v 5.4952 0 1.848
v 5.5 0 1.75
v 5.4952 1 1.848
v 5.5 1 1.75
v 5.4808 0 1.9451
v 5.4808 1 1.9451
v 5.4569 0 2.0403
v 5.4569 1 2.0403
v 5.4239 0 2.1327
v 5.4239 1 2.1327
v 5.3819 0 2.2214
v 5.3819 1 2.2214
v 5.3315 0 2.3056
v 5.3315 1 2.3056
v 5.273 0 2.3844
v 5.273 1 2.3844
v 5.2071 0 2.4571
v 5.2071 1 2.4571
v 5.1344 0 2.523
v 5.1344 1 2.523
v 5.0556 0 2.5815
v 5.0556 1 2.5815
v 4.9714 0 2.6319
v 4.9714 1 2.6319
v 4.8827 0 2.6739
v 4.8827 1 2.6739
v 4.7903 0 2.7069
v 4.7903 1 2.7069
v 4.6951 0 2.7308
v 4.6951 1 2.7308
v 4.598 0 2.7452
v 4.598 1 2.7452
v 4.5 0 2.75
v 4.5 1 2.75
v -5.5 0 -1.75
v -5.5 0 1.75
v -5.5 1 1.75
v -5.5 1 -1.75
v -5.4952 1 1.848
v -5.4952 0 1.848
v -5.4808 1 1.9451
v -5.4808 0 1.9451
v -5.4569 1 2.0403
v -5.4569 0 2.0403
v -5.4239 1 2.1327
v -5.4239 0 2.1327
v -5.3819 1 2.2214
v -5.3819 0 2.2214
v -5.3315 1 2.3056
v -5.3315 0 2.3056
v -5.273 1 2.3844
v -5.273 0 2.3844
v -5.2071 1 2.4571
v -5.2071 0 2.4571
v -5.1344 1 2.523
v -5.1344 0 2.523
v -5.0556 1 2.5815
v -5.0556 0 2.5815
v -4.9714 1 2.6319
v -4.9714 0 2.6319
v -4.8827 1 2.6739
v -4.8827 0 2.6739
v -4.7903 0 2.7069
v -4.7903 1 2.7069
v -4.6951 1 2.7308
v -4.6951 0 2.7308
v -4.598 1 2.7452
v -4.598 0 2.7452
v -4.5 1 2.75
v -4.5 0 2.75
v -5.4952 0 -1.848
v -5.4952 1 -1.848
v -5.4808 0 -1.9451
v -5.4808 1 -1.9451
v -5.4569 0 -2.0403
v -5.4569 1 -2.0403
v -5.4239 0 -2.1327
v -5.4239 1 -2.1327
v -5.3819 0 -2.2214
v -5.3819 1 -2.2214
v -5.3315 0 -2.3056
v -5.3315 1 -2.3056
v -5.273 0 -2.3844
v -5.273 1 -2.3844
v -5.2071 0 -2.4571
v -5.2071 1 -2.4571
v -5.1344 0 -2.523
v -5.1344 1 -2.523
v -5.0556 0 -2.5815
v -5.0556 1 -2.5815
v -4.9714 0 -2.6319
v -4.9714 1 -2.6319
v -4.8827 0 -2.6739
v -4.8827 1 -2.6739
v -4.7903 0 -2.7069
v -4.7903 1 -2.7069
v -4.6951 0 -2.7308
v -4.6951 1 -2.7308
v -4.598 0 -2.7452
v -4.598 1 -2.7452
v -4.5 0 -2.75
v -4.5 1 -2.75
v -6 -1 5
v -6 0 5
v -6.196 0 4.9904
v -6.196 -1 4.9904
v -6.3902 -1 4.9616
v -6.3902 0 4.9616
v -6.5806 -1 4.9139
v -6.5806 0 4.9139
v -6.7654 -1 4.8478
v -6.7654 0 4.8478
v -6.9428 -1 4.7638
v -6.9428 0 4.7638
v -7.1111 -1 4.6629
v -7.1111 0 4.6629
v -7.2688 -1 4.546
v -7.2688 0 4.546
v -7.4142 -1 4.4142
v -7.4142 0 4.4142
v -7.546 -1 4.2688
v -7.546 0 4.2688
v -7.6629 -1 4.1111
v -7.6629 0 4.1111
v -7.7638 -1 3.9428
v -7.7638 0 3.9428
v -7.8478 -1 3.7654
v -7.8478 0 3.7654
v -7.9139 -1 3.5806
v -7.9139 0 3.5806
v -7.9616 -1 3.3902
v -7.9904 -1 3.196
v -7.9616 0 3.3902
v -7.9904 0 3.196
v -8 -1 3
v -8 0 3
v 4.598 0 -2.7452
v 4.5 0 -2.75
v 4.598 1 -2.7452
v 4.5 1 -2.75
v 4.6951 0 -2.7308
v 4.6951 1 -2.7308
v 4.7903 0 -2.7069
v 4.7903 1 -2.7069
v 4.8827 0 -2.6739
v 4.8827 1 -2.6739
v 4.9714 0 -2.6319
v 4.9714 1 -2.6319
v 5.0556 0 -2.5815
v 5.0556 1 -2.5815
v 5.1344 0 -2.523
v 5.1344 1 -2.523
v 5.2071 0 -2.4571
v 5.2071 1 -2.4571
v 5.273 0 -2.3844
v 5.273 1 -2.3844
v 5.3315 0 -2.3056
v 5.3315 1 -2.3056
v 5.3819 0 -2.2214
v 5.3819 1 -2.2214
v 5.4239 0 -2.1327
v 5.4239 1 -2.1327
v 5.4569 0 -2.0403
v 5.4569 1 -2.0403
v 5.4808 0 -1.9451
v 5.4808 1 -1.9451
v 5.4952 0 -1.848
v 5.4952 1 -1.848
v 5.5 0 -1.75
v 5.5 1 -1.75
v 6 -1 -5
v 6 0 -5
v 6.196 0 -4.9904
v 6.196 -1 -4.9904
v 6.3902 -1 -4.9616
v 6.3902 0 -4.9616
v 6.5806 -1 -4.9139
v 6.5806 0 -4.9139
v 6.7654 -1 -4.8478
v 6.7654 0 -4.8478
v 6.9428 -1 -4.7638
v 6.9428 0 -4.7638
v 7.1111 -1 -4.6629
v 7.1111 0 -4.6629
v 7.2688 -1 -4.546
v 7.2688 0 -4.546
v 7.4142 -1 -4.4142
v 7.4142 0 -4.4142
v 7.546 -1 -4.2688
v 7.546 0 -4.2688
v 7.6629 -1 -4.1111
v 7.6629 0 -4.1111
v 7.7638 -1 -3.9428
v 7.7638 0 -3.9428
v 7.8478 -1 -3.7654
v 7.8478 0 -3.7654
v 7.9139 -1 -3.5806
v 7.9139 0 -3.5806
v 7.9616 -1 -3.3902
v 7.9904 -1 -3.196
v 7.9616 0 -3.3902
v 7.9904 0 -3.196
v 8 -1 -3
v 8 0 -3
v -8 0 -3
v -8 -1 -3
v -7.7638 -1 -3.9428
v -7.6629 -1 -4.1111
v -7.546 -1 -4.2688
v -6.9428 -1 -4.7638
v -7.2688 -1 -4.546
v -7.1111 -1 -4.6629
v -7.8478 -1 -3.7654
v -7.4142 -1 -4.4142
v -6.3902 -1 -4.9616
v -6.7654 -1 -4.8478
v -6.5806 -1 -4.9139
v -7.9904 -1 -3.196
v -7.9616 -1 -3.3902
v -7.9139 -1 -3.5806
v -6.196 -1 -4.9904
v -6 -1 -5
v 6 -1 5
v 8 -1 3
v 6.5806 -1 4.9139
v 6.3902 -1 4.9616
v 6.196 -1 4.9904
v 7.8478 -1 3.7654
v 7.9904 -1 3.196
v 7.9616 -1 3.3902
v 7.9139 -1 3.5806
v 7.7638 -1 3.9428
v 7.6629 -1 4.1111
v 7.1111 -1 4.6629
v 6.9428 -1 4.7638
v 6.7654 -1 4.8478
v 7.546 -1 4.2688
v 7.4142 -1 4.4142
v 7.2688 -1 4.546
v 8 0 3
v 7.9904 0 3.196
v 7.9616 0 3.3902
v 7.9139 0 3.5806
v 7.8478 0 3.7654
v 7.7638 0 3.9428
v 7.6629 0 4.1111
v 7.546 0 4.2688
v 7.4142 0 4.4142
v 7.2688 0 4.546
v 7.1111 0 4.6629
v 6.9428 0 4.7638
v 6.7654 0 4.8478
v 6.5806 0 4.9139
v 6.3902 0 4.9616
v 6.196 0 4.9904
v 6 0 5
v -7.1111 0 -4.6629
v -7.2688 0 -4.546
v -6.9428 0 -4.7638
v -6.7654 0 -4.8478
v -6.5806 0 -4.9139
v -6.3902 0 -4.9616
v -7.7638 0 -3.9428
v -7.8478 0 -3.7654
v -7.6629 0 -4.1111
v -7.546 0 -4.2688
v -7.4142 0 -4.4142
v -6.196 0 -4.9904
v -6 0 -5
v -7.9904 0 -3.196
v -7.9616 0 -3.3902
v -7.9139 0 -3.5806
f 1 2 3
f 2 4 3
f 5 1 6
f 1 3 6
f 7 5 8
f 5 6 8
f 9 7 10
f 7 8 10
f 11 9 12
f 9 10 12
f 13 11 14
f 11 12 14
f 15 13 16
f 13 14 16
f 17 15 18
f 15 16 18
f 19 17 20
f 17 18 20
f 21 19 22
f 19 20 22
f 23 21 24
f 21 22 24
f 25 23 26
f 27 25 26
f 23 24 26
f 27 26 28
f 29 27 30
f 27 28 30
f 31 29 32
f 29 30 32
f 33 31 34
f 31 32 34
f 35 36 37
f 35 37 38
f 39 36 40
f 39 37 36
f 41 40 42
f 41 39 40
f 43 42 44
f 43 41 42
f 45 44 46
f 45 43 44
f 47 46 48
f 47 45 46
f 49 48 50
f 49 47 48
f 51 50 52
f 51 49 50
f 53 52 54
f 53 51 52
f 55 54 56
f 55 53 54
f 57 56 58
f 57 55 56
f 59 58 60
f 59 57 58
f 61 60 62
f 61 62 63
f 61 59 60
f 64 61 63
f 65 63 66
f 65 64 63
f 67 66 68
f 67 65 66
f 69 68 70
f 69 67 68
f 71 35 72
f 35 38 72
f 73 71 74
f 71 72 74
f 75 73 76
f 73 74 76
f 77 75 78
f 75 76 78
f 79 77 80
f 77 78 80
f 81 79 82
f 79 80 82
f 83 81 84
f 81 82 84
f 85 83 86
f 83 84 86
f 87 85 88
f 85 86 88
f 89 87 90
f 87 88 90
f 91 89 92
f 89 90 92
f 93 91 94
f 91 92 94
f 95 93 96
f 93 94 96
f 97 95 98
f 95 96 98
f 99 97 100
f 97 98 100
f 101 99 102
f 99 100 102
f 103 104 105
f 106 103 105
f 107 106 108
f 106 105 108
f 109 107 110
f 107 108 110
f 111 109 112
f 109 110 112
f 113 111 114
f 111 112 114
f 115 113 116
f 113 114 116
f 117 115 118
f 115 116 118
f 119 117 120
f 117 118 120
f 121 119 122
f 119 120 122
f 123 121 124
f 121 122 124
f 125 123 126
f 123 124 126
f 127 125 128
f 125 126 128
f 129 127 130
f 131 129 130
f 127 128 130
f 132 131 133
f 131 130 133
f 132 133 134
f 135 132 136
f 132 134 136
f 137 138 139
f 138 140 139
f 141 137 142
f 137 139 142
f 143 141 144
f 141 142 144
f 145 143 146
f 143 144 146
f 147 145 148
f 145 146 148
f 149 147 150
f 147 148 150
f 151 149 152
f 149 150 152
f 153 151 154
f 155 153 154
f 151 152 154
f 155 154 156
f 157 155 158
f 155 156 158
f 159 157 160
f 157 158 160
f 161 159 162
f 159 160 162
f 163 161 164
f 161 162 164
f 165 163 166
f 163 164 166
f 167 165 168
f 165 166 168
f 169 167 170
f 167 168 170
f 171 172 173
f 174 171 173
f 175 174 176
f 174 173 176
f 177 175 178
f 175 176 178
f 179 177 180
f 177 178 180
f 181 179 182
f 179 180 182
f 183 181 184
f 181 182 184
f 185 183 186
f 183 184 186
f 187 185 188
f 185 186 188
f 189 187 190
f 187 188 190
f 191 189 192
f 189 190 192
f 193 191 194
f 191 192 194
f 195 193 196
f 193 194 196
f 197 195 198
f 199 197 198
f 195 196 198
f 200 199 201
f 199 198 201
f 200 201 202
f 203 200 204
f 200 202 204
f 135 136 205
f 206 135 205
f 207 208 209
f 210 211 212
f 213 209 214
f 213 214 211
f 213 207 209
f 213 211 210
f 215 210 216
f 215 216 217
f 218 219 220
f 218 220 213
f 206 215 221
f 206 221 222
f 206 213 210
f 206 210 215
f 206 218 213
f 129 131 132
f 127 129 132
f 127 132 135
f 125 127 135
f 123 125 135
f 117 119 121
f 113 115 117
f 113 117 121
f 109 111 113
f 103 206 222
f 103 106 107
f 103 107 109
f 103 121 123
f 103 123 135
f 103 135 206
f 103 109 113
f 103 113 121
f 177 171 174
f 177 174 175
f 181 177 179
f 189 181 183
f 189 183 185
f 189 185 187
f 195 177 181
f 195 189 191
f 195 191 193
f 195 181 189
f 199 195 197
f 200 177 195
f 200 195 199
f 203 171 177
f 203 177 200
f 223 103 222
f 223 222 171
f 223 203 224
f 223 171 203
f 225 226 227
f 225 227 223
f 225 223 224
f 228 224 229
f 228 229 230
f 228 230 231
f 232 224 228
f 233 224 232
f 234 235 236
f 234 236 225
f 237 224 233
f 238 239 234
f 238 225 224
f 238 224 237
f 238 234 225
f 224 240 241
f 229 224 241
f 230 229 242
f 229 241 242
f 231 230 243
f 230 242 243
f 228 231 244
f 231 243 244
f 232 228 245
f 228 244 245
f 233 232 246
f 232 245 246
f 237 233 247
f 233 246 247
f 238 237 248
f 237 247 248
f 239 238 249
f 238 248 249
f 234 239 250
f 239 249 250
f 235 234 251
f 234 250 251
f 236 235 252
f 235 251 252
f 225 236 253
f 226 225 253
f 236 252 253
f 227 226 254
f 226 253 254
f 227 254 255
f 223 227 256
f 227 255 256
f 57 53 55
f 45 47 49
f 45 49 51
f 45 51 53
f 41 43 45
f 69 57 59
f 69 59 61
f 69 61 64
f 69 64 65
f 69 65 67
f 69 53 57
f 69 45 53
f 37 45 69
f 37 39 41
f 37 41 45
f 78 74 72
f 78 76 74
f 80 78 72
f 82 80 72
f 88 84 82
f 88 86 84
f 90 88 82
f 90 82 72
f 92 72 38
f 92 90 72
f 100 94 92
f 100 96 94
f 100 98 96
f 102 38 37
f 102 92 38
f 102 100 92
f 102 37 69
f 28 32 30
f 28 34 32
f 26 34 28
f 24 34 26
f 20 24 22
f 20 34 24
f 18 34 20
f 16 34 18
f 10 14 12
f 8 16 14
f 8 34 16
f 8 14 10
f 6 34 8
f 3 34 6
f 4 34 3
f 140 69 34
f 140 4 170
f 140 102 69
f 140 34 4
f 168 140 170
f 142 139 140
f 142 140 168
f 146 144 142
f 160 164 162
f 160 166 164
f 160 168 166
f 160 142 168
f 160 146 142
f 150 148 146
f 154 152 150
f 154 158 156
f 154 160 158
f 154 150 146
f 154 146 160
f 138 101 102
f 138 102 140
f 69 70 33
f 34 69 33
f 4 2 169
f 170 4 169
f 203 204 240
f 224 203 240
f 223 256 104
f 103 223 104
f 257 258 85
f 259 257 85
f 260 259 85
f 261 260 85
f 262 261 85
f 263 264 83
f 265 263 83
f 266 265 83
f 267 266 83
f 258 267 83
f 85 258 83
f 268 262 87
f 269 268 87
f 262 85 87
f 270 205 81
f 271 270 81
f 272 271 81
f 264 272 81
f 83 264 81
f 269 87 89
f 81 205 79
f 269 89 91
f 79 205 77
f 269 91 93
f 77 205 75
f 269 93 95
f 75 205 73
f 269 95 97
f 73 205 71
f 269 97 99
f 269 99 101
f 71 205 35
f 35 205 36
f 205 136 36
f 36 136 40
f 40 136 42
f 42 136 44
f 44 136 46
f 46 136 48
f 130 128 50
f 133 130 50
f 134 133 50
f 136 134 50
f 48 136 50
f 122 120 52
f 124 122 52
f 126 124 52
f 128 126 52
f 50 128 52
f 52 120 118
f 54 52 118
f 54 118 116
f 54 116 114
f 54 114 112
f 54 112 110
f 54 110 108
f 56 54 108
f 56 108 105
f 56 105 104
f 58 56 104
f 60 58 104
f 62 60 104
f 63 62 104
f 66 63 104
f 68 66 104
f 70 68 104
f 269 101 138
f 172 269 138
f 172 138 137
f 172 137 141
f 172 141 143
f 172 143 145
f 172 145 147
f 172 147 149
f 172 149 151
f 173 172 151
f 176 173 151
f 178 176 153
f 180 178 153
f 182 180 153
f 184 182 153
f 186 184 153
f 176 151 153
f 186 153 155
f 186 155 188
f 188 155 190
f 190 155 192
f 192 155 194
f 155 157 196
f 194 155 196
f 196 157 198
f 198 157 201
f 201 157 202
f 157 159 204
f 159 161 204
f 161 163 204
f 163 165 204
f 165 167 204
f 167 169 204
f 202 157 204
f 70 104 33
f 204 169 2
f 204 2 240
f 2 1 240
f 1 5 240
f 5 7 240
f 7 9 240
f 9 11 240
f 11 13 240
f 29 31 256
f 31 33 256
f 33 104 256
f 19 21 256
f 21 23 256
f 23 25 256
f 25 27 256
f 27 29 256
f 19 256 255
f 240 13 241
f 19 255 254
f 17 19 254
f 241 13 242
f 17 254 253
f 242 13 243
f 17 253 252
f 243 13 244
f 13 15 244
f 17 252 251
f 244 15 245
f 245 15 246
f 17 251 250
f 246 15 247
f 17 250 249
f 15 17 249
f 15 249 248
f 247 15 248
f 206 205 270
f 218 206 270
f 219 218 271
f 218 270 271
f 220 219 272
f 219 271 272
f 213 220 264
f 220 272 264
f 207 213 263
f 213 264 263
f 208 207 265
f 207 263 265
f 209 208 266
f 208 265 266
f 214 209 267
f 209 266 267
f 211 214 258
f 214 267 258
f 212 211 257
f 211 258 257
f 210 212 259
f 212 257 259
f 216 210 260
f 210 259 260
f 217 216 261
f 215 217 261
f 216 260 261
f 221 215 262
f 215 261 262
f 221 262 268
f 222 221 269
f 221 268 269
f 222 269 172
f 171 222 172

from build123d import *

# Parameters (mm, degrees)
SKETCH1_W           = 11
SKETCH1_H           = 5.5
BOSS_EXTRUDE1_DEPTH = 1
BOSS_EXTRUDE2_DEPTH = 1
FILLET1_R           = 1


with BuildPart() as part:
    # Sketch1 → Boss-Extrude1 (new body)
    with BuildSketch(Plane(origin=(0, 0, 0), x_dir=(1, 0, 0), z_dir=(0, 1, 0))):
        Rectangle(SKETCH1_W, SKETCH1_H)
    extrude(amount=BOSS_EXTRUDE1_DEPTH)

    # Sketch2 → Boss-Extrude2 (add)
    with BuildSketch(Plane.XZ):
        with BuildLine():
            Line((6, 5), (-6, 5))
            ThreePointArc((-6, 5), (-7.414213562, 4.414213562), (-8, 3))
            Line((-8, 3), (-8, -3))
            ThreePointArc((-8, -3), (-7.414213562, -4.414213562), (-6, -5))
            Line((-6, -5), (6, -5))
            ThreePointArc((6, -5), (7.414213562, -4.414213562), (8, -3))
            Line((8, -3), (8, 3))
            ThreePointArc((8, 3), (7.414213562, 4.414213562), (6, 5))
        make_face()
    extrude(amount=BOSS_EXTRUDE2_DEPTH)

    # Fillet1
    fillet1_edges = [part.edges().sort_by_distance(p)[0] for p in [
        (5.5, 0.5, 2.75),
        (5.5, 0.5, -2.75),
        (-5.5, 0.5, -2.75),
        (-5.5, 0.5, 2.75),
    ]]
    fillet(fillet1_edges, radius=FILLET1_R)


solid = part.part
